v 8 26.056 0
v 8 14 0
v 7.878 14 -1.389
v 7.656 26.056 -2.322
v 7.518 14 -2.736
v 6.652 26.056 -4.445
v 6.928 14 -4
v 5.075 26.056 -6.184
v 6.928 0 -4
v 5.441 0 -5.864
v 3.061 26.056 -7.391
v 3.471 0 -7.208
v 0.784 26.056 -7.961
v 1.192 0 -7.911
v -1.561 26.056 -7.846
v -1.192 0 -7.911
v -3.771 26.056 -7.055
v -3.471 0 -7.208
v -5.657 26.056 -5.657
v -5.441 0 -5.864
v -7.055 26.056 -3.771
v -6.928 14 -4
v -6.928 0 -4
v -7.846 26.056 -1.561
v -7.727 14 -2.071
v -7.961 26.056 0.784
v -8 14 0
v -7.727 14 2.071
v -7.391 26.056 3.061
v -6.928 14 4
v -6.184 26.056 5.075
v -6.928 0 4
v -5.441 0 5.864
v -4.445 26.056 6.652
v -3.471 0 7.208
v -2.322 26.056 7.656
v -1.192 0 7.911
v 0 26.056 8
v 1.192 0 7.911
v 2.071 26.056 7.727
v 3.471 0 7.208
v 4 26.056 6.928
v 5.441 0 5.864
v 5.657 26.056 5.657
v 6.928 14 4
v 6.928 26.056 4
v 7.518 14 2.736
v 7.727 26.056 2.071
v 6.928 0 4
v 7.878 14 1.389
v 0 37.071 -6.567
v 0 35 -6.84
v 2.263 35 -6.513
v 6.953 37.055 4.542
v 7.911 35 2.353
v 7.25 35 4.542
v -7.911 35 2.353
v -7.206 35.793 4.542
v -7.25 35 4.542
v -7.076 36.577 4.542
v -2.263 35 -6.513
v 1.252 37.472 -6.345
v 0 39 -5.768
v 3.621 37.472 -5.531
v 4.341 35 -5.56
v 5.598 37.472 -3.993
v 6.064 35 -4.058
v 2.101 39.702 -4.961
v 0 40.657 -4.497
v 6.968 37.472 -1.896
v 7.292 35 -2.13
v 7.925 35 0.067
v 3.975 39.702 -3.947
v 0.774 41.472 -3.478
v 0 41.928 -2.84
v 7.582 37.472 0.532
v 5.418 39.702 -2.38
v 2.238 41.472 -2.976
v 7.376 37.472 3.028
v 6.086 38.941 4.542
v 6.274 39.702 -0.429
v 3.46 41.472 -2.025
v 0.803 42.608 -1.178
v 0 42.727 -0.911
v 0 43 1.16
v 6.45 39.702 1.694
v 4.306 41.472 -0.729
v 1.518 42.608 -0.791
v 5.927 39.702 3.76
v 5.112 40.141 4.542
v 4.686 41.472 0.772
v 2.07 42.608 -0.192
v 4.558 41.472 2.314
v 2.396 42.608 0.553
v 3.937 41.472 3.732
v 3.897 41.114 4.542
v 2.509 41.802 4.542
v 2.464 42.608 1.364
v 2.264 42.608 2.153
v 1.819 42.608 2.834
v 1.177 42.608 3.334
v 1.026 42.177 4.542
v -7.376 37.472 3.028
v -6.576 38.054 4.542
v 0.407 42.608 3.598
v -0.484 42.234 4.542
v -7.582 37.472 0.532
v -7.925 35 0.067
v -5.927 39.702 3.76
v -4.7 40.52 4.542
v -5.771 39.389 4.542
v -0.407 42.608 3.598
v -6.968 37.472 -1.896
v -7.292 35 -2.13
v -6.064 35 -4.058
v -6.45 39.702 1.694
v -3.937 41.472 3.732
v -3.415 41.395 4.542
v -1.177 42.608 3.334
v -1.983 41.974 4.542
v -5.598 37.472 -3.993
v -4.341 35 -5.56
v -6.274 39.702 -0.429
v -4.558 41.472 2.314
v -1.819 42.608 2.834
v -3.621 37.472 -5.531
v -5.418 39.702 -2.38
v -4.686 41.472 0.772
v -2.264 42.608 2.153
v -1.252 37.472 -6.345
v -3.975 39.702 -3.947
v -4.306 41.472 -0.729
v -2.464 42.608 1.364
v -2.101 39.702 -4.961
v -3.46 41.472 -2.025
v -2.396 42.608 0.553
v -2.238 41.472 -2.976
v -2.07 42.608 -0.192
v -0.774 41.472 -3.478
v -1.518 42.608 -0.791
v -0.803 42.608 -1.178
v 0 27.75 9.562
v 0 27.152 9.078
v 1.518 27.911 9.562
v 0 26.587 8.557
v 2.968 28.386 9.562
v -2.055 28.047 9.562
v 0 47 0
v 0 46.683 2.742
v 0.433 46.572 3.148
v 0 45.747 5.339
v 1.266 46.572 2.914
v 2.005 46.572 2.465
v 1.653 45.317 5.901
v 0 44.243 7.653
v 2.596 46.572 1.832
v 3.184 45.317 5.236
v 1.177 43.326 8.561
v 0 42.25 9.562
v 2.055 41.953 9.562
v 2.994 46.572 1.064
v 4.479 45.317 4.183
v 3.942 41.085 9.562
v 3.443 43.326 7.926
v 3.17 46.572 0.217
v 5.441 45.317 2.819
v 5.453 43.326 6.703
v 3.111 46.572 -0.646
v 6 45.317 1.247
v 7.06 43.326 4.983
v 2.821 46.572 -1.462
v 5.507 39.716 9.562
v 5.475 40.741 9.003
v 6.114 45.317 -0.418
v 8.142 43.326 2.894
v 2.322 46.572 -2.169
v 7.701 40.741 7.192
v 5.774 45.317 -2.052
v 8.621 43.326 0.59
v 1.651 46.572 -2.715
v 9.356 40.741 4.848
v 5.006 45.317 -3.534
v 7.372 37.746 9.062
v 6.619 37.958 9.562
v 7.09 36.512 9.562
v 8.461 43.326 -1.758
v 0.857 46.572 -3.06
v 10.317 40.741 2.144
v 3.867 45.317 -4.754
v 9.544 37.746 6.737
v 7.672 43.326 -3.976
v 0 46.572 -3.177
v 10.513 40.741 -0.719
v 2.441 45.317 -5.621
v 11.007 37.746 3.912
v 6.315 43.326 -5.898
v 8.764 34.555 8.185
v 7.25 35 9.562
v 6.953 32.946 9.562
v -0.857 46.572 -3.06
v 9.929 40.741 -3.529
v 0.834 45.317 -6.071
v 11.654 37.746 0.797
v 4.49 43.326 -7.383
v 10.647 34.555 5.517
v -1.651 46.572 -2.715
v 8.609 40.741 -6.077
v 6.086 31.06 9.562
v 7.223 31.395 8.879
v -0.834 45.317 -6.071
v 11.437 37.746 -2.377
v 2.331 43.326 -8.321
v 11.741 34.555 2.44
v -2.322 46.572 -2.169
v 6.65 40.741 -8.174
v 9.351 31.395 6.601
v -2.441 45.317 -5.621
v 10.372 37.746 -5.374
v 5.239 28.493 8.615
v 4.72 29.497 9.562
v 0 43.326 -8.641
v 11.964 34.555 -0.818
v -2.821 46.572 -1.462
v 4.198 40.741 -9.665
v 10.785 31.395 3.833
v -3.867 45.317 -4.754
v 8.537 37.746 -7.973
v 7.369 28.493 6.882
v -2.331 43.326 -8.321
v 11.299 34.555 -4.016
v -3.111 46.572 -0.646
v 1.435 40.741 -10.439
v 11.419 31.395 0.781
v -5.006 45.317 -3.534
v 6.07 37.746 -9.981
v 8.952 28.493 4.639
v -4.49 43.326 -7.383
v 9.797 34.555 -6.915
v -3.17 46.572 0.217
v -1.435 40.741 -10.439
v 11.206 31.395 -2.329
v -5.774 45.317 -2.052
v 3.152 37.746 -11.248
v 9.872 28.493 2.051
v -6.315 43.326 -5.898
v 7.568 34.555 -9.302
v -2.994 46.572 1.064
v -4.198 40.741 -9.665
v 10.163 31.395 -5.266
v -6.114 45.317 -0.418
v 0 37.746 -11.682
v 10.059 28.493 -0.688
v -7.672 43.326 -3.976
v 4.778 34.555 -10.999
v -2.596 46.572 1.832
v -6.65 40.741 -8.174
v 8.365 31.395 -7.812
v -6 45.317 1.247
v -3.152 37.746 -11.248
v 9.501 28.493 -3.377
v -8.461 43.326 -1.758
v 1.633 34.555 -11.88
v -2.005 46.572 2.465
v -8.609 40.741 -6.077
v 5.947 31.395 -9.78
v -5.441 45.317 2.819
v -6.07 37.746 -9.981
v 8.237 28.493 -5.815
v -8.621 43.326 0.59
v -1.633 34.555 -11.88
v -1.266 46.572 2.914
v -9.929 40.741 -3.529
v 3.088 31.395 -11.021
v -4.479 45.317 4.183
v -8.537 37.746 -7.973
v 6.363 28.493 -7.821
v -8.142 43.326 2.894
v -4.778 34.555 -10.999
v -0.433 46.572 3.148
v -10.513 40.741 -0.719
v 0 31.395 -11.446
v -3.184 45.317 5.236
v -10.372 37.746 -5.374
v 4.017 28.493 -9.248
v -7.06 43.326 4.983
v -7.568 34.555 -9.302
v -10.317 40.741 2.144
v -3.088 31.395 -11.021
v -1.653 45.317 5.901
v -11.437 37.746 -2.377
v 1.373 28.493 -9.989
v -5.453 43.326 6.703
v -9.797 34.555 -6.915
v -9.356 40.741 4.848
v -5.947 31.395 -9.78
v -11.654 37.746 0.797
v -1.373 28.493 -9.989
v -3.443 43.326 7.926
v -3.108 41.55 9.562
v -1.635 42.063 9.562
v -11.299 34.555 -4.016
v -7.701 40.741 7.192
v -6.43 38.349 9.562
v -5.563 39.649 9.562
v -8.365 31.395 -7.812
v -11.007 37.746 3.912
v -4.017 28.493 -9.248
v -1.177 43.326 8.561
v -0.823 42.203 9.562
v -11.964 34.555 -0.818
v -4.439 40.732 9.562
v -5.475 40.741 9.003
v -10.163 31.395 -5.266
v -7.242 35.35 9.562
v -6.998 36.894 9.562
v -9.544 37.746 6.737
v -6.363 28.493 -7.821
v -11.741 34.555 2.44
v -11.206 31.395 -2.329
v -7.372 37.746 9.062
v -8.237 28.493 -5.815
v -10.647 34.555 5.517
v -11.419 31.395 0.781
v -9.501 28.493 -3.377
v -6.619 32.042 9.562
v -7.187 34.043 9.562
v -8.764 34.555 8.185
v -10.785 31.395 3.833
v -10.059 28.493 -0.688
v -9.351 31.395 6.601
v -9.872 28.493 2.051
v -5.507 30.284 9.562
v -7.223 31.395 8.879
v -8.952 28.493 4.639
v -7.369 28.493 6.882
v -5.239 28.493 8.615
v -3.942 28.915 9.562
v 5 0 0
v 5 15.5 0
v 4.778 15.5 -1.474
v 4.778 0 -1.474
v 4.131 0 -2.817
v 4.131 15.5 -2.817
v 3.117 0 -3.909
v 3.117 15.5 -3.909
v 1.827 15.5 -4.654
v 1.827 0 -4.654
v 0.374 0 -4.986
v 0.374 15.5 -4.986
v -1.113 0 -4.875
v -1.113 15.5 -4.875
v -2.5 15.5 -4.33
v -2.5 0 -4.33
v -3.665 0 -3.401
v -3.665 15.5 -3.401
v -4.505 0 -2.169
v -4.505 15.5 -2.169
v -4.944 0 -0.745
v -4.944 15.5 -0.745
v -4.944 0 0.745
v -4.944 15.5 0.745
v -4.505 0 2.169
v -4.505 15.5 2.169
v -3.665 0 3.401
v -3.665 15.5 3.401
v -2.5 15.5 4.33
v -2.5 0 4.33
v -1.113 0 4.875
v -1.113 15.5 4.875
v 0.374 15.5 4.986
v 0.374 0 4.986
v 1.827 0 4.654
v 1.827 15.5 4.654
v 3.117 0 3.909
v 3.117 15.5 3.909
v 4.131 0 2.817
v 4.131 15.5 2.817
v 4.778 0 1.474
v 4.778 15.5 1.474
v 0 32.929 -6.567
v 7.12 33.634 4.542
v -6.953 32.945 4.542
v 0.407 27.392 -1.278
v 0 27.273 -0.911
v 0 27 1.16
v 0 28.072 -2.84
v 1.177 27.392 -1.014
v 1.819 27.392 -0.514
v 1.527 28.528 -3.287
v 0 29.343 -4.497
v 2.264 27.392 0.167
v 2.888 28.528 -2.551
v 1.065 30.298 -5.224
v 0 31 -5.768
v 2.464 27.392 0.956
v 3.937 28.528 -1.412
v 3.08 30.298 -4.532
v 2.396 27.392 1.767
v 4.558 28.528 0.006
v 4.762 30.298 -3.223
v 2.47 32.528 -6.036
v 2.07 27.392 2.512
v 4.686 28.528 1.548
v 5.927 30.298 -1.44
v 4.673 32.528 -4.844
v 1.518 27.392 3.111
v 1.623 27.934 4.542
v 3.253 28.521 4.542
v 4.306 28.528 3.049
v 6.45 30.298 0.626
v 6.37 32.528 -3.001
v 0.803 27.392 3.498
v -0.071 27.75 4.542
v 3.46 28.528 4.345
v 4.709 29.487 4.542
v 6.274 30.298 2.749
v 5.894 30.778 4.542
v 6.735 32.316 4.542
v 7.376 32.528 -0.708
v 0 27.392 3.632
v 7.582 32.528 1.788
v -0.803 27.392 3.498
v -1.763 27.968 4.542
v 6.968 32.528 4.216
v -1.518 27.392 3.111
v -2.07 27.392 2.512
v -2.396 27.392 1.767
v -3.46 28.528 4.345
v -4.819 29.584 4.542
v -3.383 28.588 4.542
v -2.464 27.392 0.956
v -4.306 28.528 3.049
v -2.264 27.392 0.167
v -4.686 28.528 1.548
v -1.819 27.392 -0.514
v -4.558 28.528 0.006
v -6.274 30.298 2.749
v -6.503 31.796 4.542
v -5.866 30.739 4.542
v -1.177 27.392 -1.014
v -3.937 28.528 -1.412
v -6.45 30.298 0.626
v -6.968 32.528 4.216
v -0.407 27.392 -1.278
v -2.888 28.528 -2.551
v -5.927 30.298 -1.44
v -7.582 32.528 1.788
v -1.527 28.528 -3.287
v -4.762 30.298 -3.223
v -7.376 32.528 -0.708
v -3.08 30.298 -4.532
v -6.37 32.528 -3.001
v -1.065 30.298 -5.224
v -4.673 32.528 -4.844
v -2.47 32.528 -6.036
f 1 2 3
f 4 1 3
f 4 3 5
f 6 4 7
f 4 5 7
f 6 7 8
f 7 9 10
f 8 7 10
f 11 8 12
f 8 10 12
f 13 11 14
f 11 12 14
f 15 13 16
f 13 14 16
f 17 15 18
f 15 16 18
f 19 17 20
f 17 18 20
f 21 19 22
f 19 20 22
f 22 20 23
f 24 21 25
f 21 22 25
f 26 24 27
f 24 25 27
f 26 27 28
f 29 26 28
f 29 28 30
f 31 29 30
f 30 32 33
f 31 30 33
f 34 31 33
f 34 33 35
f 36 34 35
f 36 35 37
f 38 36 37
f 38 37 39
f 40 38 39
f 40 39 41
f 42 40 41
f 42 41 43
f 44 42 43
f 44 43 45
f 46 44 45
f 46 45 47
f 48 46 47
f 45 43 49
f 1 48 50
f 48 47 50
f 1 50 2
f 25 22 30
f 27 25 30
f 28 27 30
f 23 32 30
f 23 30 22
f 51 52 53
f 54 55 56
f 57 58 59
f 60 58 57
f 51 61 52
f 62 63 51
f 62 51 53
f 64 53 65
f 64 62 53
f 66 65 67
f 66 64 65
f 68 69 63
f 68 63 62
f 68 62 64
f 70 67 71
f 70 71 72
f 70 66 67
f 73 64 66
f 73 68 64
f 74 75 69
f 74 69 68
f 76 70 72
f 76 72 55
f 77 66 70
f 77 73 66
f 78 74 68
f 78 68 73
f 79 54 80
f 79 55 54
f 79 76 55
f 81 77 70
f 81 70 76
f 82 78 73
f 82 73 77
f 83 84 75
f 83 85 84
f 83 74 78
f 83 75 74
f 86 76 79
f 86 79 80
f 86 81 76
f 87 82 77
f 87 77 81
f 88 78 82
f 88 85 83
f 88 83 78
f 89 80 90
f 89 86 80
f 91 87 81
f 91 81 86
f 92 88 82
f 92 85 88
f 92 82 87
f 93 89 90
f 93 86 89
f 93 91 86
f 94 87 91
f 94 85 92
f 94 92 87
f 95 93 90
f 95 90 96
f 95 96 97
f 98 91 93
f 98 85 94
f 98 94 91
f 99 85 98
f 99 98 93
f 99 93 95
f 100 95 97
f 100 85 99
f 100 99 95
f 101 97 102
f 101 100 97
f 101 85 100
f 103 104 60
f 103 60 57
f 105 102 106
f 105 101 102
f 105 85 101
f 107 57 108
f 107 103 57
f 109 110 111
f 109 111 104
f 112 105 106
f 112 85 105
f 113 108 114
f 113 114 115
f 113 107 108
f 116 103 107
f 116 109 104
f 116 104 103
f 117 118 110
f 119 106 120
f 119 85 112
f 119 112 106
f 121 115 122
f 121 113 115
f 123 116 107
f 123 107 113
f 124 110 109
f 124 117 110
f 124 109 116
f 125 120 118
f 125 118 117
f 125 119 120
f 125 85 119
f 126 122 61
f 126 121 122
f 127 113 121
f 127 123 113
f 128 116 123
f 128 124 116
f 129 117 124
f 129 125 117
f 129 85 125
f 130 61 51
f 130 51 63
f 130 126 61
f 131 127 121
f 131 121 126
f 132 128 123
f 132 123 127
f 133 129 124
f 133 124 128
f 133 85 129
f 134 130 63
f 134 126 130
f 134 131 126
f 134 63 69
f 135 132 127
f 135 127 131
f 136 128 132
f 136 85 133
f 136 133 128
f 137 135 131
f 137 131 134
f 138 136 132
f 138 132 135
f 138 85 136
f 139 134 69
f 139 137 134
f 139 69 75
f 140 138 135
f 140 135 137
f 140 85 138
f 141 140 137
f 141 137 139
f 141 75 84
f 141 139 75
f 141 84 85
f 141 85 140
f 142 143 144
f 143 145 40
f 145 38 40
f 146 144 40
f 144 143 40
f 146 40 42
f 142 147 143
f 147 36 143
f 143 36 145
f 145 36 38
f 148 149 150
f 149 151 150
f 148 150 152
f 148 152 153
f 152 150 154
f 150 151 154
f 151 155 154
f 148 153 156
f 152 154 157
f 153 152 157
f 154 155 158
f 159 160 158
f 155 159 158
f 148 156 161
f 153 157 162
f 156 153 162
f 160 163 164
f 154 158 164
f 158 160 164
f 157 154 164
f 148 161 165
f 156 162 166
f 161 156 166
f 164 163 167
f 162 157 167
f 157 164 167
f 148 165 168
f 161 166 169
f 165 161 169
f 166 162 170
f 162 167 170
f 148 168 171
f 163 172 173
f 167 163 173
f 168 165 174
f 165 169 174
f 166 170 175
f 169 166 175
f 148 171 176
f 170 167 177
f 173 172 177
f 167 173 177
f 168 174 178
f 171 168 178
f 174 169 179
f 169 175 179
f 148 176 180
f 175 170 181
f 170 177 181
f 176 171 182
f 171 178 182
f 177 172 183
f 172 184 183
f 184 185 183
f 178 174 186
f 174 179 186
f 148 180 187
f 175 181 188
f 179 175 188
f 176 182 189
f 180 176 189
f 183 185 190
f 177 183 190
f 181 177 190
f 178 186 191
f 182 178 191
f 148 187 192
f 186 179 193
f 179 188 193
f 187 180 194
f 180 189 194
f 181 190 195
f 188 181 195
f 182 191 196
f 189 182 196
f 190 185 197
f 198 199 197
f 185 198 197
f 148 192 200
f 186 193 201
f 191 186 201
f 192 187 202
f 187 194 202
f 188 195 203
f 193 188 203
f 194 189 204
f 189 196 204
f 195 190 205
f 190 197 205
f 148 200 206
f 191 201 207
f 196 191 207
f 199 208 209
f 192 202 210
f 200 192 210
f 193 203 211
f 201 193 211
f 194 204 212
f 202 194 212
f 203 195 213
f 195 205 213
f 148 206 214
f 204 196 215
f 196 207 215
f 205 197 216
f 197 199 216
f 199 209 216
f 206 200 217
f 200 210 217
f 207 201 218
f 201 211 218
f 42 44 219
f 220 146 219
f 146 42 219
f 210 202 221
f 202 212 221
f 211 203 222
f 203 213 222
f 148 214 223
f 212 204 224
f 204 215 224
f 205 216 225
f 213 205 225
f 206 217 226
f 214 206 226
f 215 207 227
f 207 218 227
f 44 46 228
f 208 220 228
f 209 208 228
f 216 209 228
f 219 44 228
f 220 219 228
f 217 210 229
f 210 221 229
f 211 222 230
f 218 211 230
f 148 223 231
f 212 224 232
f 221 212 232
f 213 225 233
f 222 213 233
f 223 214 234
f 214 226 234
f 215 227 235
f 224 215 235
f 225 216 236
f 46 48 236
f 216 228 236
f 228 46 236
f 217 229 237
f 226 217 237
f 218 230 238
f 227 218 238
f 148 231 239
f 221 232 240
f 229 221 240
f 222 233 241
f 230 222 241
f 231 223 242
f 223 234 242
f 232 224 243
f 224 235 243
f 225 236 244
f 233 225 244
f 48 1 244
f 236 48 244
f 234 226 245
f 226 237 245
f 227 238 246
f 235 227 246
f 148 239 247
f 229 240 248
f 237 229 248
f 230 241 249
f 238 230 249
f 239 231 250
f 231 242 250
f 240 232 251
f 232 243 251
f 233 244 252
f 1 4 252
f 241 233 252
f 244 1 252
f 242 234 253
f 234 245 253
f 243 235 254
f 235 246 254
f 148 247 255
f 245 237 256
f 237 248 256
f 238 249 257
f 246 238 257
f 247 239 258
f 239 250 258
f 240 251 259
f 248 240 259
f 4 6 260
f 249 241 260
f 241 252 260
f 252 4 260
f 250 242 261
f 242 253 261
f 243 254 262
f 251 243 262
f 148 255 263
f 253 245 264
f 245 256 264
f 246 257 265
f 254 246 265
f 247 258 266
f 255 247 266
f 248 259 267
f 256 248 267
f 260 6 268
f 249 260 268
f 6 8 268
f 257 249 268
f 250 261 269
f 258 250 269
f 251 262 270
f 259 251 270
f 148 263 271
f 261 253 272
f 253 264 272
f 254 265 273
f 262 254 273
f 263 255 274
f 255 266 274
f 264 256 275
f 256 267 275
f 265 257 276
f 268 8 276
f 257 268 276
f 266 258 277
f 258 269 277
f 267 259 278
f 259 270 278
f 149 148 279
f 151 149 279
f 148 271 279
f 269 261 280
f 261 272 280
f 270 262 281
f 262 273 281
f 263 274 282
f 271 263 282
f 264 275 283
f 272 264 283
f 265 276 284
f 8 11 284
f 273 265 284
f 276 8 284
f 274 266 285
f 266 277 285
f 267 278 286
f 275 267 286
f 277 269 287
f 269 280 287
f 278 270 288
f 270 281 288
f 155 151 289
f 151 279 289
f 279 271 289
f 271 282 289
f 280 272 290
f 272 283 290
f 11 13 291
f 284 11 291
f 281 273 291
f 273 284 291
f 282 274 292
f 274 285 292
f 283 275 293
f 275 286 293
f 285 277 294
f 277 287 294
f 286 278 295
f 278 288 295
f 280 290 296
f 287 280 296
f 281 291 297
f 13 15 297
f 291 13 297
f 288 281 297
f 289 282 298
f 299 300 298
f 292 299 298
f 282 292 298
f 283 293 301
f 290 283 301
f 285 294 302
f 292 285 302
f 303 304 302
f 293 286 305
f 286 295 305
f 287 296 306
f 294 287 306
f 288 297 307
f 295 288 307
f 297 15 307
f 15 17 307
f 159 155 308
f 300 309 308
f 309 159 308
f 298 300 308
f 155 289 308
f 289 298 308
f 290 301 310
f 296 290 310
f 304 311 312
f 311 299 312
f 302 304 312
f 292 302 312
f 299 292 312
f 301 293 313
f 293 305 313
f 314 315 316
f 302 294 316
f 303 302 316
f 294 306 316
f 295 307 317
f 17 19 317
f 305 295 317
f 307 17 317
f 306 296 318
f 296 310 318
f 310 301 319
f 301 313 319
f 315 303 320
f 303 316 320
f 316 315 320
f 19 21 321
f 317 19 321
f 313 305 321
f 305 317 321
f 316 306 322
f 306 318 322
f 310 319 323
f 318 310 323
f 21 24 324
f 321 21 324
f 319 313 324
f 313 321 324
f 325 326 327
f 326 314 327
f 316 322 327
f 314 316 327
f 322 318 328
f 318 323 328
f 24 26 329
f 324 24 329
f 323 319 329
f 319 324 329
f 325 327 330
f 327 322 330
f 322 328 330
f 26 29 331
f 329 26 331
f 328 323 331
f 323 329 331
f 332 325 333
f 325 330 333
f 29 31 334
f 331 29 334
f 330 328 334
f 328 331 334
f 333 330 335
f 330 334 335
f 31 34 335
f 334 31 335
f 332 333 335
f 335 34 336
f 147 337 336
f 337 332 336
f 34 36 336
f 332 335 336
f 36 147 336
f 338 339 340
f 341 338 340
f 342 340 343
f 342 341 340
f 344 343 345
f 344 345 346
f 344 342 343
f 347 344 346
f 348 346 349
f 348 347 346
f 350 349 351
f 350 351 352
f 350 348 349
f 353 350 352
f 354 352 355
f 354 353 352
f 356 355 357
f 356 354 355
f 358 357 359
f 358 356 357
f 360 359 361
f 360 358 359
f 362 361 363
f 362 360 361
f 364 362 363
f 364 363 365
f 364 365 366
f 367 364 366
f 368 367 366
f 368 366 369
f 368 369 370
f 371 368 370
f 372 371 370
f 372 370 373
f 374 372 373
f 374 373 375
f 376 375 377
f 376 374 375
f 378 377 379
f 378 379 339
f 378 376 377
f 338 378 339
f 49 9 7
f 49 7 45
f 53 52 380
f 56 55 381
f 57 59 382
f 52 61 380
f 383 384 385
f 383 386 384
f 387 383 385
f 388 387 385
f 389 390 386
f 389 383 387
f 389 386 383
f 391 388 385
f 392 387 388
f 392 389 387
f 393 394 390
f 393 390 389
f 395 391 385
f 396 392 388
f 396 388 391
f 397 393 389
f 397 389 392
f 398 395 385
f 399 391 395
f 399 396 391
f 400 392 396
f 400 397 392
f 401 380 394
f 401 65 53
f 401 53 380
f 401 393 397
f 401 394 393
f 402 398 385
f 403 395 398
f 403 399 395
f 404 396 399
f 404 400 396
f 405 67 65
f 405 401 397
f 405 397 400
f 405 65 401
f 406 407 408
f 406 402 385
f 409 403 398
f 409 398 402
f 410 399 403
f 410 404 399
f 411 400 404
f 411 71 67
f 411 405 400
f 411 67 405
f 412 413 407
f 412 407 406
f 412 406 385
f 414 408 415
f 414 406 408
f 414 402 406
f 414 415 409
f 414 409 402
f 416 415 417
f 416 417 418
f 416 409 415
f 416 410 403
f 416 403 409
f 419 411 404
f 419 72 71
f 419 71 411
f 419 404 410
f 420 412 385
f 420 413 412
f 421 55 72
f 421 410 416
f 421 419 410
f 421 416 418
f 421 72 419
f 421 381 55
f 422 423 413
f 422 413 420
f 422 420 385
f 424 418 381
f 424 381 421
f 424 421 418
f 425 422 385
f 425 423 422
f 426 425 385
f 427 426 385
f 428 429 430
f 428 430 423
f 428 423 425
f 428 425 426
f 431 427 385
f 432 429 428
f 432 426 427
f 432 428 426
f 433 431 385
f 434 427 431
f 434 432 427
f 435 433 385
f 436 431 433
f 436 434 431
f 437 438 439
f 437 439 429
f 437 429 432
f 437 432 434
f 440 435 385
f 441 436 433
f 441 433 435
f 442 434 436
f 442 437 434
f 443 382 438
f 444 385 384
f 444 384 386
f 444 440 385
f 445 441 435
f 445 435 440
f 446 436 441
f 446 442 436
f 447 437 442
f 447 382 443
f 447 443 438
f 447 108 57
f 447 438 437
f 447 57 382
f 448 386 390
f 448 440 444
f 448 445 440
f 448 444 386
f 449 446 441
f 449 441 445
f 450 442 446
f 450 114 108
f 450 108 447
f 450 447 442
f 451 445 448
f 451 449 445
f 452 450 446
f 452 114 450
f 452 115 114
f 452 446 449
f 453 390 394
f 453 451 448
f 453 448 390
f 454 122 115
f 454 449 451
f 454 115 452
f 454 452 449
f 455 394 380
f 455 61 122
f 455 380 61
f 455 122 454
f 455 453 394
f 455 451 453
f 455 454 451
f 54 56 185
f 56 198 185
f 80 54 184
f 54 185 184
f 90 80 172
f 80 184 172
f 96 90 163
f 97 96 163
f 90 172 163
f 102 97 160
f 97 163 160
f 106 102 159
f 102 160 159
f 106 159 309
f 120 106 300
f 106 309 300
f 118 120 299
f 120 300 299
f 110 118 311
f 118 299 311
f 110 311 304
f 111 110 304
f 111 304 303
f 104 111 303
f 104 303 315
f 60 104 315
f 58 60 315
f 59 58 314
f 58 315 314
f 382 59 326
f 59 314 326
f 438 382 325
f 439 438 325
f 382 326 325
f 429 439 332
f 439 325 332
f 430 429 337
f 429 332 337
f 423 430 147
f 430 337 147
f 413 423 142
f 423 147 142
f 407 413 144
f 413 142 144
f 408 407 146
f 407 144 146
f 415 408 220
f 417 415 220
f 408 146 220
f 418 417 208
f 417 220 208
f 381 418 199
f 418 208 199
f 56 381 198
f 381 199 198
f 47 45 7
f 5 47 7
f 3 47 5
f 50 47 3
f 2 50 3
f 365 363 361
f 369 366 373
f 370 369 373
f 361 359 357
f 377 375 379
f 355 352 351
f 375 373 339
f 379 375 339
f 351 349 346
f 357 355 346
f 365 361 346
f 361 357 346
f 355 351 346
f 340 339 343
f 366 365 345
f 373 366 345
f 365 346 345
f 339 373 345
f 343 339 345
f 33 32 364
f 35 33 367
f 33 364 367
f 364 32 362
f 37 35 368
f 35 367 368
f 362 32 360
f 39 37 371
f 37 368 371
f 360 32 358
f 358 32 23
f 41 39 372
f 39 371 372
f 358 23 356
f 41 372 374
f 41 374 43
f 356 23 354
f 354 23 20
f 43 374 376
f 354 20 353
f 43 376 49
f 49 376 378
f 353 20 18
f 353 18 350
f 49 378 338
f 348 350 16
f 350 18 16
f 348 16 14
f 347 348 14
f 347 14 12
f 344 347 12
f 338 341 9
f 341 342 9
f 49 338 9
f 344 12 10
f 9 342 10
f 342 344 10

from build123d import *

# Parameters (mm, degrees)
SKETCH1_R           = 8
BOSS_EXTRUDE1_DEPTH = 35
CUT_EXTRUDE1_DEPTH  = 14
SKETCH1_4_R         = 5
CUT_EXTRUDE2_DEPTH  = 15.5
CUT_EXTRUDE3_REACH  = 26
SKETCH5_R           = 7.25


with BuildPart() as part:
    # Sketch1 → Boss-Extrude1 (new body)
    with BuildSketch(Plane(origin=(0, 0, 0), x_dir=(1, 0, 0), z_dir=(0, 1, 0))):
        Circle(SKETCH1_R)
    extrude(amount=BOSS_EXTRUDE1_DEPTH)

    # Sketch1_3 → Cut-Extrude1 (cut)
    with BuildSketch(Plane(origin=(0, 0, 0), x_dir=(1, 0, 0), z_dir=(0, 1, 0))):
        with BuildLine():
            Line((6.92820323, 4), (6.92820323, -4))
            ThreePointArc((6.92820323, -4), (7.72740661, -2.070552361), (8, 0))
            ThreePointArc((8, 0), (7.72740661, 2.070552361), (6.92820323, 4))
        make_face()
        with BuildLine():
            ThreePointArc((-6.92820323, 4), (-8, 0), (-6.92820323, -4))
            Line((-6.92820323, -4), (-6.92820323, 4))
        make_face()
    extrude(amount=CUT_EXTRUDE1_DEPTH, mode=Mode.SUBTRACT)

    # Sketch1_4 → Cut-Extrude2 (cut)
    with BuildSketch(Plane(origin=(0, 0, 0), x_dir=(1, 0, 0), z_dir=(0, 1, 0))):
        Circle(SKETCH1_4_R)
    extrude(amount=CUT_EXTRUDE2_DEPTH, mode=Mode.SUBTRACT)

    # Sketch2 one side → Revolve13 (revolve)
    with BuildSketch(Plane(origin=(0, 0, 0), x_dir=(0, 0, -1), z_dir=(1, 0, 0))):
        with BuildLine():
            Line((0, 23), (0, 47))
            ThreePointArc((0, 47), (-12, 35), (0, 23))
        make_face()
    revolve(axis=Axis((0, 35, 0), (0, 1, 0)))

    # Sketch4 one side → Cut-Revolve2 (revolve, cut)
    with BuildSketch(Plane(origin=(0, 0, 0), x_dir=(0, 0, -1), z_dir=(1, 0, 0))):
        with BuildLine():
            ThreePointArc((6.84, 35), (4.496854249, 40.656854249), (-1.16, 43))
            Line((-1.16, 43), (-1.16, 27))
            ThreePointArc((-1.16, 27), (4.496854249, 29.343145751), (6.84, 35))
        make_face()
    revolve(axis=Axis((0, 27, 1.16), (0, -1, 0)), mode=Mode.SUBTRACT)

    # Sketch5 → Cut-Extrude3 (cut, up to next)
    with BuildSketch(Plane.XY.offset(12), mode=Mode.PRIVATE) as cut_extrude3_sk1:
        with Locations((0, 35)):
            Circle(SKETCH5_R)
    cut_extrude3_tool1 = extrude(cut_extrude3_sk1.sketch, amount=-CUT_EXTRUDE3_REACH, mode=Mode.PRIVATE) & part.part
    add(cut_extrude3_tool1.solids().sort_by_distance((0, 35, 12))[0], mode=Mode.SUBTRACT)


solid = part.part
